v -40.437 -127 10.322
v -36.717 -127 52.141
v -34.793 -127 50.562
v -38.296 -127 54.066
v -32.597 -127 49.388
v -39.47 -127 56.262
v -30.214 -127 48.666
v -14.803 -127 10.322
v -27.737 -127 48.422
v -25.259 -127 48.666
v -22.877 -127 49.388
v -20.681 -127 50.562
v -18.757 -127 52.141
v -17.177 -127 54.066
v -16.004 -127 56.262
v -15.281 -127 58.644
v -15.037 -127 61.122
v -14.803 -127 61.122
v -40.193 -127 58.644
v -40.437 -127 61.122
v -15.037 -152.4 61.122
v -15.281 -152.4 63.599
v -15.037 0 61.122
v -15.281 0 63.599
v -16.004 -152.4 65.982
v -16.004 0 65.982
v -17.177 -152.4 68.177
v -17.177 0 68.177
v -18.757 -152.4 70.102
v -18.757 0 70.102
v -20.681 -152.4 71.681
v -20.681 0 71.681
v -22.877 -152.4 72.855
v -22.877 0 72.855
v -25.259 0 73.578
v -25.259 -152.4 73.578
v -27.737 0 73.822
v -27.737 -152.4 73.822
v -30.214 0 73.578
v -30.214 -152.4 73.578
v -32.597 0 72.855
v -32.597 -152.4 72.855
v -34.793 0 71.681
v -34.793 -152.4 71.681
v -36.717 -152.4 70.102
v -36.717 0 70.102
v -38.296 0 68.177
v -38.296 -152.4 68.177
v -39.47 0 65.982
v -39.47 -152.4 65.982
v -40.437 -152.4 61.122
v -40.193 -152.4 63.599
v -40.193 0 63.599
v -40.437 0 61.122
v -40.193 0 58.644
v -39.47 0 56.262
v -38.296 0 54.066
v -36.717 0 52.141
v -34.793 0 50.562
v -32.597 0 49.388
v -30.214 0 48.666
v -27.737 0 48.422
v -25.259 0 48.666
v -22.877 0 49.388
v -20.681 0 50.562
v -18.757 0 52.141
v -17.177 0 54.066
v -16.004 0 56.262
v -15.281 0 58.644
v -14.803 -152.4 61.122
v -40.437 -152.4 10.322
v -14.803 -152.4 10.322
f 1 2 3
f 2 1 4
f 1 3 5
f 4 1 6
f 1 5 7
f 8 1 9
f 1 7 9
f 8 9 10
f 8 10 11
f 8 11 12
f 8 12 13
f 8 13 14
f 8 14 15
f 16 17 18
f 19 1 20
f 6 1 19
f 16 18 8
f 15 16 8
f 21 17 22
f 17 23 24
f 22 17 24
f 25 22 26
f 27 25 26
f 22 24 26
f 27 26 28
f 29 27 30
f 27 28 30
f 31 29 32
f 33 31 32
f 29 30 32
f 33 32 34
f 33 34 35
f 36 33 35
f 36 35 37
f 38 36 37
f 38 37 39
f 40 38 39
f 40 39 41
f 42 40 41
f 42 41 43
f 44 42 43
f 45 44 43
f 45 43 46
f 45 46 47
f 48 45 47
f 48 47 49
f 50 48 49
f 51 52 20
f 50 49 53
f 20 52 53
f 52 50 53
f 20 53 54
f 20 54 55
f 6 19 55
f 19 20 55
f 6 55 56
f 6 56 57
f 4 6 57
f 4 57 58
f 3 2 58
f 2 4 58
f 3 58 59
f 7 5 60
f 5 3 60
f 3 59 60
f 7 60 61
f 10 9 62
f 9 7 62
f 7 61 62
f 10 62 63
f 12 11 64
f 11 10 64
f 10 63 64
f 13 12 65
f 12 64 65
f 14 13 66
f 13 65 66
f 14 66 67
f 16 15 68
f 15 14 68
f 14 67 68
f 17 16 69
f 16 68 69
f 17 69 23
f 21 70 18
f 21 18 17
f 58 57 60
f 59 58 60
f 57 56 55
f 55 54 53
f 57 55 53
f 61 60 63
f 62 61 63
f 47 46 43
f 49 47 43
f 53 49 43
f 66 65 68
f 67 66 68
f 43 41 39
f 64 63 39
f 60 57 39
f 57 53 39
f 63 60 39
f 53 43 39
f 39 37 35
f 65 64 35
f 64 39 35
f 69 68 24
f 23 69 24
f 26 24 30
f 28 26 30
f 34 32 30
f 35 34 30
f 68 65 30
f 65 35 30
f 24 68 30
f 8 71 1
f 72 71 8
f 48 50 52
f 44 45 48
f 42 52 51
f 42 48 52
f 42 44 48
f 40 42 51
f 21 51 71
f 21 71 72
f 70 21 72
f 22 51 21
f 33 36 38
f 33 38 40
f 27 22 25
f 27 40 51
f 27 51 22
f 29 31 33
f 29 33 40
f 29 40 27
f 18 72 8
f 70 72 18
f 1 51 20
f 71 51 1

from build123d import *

# Parameters (mm, degrees)
F1_R     = 12.7
F2_DEPTH = 152.4
F4_DEPTH = 25.4


with BuildPart() as f2:
    # F1 (on face) → F2 (new body)
    with BuildSketch(Plane.XZ):
        with Locations((-27.7367867529, 61.1216872931)):
            Circle(F1_R)
    extrude(amount=F2_DEPTH)

    # F3 (on face) → F4 (join)
    with BuildSketch(Plane.XZ.offset(152.4)):
        with BuildLine():
            Line((-14.8034961894, 61.1216872931), (-15.0367867529, 61.1216872931))
            ThreePointArc((-15.0367867529, 61.1216872931), (-27.7367867529, 48.4216872931), (-40.4367867529, 61.1216872931))
            Line((-40.4367867529, 61.1216872931), (-40.4367867529, 10.3216872931))
            Line((-40.4367867529, 10.3216872931), (-14.8034961894, 10.3216872931))
            Line((-14.8034961894, 10.3216872931), (-14.8034961894, 61.1216872931))
        make_face()
    extrude(amount=-F4_DEPTH)


solid = f2.part
